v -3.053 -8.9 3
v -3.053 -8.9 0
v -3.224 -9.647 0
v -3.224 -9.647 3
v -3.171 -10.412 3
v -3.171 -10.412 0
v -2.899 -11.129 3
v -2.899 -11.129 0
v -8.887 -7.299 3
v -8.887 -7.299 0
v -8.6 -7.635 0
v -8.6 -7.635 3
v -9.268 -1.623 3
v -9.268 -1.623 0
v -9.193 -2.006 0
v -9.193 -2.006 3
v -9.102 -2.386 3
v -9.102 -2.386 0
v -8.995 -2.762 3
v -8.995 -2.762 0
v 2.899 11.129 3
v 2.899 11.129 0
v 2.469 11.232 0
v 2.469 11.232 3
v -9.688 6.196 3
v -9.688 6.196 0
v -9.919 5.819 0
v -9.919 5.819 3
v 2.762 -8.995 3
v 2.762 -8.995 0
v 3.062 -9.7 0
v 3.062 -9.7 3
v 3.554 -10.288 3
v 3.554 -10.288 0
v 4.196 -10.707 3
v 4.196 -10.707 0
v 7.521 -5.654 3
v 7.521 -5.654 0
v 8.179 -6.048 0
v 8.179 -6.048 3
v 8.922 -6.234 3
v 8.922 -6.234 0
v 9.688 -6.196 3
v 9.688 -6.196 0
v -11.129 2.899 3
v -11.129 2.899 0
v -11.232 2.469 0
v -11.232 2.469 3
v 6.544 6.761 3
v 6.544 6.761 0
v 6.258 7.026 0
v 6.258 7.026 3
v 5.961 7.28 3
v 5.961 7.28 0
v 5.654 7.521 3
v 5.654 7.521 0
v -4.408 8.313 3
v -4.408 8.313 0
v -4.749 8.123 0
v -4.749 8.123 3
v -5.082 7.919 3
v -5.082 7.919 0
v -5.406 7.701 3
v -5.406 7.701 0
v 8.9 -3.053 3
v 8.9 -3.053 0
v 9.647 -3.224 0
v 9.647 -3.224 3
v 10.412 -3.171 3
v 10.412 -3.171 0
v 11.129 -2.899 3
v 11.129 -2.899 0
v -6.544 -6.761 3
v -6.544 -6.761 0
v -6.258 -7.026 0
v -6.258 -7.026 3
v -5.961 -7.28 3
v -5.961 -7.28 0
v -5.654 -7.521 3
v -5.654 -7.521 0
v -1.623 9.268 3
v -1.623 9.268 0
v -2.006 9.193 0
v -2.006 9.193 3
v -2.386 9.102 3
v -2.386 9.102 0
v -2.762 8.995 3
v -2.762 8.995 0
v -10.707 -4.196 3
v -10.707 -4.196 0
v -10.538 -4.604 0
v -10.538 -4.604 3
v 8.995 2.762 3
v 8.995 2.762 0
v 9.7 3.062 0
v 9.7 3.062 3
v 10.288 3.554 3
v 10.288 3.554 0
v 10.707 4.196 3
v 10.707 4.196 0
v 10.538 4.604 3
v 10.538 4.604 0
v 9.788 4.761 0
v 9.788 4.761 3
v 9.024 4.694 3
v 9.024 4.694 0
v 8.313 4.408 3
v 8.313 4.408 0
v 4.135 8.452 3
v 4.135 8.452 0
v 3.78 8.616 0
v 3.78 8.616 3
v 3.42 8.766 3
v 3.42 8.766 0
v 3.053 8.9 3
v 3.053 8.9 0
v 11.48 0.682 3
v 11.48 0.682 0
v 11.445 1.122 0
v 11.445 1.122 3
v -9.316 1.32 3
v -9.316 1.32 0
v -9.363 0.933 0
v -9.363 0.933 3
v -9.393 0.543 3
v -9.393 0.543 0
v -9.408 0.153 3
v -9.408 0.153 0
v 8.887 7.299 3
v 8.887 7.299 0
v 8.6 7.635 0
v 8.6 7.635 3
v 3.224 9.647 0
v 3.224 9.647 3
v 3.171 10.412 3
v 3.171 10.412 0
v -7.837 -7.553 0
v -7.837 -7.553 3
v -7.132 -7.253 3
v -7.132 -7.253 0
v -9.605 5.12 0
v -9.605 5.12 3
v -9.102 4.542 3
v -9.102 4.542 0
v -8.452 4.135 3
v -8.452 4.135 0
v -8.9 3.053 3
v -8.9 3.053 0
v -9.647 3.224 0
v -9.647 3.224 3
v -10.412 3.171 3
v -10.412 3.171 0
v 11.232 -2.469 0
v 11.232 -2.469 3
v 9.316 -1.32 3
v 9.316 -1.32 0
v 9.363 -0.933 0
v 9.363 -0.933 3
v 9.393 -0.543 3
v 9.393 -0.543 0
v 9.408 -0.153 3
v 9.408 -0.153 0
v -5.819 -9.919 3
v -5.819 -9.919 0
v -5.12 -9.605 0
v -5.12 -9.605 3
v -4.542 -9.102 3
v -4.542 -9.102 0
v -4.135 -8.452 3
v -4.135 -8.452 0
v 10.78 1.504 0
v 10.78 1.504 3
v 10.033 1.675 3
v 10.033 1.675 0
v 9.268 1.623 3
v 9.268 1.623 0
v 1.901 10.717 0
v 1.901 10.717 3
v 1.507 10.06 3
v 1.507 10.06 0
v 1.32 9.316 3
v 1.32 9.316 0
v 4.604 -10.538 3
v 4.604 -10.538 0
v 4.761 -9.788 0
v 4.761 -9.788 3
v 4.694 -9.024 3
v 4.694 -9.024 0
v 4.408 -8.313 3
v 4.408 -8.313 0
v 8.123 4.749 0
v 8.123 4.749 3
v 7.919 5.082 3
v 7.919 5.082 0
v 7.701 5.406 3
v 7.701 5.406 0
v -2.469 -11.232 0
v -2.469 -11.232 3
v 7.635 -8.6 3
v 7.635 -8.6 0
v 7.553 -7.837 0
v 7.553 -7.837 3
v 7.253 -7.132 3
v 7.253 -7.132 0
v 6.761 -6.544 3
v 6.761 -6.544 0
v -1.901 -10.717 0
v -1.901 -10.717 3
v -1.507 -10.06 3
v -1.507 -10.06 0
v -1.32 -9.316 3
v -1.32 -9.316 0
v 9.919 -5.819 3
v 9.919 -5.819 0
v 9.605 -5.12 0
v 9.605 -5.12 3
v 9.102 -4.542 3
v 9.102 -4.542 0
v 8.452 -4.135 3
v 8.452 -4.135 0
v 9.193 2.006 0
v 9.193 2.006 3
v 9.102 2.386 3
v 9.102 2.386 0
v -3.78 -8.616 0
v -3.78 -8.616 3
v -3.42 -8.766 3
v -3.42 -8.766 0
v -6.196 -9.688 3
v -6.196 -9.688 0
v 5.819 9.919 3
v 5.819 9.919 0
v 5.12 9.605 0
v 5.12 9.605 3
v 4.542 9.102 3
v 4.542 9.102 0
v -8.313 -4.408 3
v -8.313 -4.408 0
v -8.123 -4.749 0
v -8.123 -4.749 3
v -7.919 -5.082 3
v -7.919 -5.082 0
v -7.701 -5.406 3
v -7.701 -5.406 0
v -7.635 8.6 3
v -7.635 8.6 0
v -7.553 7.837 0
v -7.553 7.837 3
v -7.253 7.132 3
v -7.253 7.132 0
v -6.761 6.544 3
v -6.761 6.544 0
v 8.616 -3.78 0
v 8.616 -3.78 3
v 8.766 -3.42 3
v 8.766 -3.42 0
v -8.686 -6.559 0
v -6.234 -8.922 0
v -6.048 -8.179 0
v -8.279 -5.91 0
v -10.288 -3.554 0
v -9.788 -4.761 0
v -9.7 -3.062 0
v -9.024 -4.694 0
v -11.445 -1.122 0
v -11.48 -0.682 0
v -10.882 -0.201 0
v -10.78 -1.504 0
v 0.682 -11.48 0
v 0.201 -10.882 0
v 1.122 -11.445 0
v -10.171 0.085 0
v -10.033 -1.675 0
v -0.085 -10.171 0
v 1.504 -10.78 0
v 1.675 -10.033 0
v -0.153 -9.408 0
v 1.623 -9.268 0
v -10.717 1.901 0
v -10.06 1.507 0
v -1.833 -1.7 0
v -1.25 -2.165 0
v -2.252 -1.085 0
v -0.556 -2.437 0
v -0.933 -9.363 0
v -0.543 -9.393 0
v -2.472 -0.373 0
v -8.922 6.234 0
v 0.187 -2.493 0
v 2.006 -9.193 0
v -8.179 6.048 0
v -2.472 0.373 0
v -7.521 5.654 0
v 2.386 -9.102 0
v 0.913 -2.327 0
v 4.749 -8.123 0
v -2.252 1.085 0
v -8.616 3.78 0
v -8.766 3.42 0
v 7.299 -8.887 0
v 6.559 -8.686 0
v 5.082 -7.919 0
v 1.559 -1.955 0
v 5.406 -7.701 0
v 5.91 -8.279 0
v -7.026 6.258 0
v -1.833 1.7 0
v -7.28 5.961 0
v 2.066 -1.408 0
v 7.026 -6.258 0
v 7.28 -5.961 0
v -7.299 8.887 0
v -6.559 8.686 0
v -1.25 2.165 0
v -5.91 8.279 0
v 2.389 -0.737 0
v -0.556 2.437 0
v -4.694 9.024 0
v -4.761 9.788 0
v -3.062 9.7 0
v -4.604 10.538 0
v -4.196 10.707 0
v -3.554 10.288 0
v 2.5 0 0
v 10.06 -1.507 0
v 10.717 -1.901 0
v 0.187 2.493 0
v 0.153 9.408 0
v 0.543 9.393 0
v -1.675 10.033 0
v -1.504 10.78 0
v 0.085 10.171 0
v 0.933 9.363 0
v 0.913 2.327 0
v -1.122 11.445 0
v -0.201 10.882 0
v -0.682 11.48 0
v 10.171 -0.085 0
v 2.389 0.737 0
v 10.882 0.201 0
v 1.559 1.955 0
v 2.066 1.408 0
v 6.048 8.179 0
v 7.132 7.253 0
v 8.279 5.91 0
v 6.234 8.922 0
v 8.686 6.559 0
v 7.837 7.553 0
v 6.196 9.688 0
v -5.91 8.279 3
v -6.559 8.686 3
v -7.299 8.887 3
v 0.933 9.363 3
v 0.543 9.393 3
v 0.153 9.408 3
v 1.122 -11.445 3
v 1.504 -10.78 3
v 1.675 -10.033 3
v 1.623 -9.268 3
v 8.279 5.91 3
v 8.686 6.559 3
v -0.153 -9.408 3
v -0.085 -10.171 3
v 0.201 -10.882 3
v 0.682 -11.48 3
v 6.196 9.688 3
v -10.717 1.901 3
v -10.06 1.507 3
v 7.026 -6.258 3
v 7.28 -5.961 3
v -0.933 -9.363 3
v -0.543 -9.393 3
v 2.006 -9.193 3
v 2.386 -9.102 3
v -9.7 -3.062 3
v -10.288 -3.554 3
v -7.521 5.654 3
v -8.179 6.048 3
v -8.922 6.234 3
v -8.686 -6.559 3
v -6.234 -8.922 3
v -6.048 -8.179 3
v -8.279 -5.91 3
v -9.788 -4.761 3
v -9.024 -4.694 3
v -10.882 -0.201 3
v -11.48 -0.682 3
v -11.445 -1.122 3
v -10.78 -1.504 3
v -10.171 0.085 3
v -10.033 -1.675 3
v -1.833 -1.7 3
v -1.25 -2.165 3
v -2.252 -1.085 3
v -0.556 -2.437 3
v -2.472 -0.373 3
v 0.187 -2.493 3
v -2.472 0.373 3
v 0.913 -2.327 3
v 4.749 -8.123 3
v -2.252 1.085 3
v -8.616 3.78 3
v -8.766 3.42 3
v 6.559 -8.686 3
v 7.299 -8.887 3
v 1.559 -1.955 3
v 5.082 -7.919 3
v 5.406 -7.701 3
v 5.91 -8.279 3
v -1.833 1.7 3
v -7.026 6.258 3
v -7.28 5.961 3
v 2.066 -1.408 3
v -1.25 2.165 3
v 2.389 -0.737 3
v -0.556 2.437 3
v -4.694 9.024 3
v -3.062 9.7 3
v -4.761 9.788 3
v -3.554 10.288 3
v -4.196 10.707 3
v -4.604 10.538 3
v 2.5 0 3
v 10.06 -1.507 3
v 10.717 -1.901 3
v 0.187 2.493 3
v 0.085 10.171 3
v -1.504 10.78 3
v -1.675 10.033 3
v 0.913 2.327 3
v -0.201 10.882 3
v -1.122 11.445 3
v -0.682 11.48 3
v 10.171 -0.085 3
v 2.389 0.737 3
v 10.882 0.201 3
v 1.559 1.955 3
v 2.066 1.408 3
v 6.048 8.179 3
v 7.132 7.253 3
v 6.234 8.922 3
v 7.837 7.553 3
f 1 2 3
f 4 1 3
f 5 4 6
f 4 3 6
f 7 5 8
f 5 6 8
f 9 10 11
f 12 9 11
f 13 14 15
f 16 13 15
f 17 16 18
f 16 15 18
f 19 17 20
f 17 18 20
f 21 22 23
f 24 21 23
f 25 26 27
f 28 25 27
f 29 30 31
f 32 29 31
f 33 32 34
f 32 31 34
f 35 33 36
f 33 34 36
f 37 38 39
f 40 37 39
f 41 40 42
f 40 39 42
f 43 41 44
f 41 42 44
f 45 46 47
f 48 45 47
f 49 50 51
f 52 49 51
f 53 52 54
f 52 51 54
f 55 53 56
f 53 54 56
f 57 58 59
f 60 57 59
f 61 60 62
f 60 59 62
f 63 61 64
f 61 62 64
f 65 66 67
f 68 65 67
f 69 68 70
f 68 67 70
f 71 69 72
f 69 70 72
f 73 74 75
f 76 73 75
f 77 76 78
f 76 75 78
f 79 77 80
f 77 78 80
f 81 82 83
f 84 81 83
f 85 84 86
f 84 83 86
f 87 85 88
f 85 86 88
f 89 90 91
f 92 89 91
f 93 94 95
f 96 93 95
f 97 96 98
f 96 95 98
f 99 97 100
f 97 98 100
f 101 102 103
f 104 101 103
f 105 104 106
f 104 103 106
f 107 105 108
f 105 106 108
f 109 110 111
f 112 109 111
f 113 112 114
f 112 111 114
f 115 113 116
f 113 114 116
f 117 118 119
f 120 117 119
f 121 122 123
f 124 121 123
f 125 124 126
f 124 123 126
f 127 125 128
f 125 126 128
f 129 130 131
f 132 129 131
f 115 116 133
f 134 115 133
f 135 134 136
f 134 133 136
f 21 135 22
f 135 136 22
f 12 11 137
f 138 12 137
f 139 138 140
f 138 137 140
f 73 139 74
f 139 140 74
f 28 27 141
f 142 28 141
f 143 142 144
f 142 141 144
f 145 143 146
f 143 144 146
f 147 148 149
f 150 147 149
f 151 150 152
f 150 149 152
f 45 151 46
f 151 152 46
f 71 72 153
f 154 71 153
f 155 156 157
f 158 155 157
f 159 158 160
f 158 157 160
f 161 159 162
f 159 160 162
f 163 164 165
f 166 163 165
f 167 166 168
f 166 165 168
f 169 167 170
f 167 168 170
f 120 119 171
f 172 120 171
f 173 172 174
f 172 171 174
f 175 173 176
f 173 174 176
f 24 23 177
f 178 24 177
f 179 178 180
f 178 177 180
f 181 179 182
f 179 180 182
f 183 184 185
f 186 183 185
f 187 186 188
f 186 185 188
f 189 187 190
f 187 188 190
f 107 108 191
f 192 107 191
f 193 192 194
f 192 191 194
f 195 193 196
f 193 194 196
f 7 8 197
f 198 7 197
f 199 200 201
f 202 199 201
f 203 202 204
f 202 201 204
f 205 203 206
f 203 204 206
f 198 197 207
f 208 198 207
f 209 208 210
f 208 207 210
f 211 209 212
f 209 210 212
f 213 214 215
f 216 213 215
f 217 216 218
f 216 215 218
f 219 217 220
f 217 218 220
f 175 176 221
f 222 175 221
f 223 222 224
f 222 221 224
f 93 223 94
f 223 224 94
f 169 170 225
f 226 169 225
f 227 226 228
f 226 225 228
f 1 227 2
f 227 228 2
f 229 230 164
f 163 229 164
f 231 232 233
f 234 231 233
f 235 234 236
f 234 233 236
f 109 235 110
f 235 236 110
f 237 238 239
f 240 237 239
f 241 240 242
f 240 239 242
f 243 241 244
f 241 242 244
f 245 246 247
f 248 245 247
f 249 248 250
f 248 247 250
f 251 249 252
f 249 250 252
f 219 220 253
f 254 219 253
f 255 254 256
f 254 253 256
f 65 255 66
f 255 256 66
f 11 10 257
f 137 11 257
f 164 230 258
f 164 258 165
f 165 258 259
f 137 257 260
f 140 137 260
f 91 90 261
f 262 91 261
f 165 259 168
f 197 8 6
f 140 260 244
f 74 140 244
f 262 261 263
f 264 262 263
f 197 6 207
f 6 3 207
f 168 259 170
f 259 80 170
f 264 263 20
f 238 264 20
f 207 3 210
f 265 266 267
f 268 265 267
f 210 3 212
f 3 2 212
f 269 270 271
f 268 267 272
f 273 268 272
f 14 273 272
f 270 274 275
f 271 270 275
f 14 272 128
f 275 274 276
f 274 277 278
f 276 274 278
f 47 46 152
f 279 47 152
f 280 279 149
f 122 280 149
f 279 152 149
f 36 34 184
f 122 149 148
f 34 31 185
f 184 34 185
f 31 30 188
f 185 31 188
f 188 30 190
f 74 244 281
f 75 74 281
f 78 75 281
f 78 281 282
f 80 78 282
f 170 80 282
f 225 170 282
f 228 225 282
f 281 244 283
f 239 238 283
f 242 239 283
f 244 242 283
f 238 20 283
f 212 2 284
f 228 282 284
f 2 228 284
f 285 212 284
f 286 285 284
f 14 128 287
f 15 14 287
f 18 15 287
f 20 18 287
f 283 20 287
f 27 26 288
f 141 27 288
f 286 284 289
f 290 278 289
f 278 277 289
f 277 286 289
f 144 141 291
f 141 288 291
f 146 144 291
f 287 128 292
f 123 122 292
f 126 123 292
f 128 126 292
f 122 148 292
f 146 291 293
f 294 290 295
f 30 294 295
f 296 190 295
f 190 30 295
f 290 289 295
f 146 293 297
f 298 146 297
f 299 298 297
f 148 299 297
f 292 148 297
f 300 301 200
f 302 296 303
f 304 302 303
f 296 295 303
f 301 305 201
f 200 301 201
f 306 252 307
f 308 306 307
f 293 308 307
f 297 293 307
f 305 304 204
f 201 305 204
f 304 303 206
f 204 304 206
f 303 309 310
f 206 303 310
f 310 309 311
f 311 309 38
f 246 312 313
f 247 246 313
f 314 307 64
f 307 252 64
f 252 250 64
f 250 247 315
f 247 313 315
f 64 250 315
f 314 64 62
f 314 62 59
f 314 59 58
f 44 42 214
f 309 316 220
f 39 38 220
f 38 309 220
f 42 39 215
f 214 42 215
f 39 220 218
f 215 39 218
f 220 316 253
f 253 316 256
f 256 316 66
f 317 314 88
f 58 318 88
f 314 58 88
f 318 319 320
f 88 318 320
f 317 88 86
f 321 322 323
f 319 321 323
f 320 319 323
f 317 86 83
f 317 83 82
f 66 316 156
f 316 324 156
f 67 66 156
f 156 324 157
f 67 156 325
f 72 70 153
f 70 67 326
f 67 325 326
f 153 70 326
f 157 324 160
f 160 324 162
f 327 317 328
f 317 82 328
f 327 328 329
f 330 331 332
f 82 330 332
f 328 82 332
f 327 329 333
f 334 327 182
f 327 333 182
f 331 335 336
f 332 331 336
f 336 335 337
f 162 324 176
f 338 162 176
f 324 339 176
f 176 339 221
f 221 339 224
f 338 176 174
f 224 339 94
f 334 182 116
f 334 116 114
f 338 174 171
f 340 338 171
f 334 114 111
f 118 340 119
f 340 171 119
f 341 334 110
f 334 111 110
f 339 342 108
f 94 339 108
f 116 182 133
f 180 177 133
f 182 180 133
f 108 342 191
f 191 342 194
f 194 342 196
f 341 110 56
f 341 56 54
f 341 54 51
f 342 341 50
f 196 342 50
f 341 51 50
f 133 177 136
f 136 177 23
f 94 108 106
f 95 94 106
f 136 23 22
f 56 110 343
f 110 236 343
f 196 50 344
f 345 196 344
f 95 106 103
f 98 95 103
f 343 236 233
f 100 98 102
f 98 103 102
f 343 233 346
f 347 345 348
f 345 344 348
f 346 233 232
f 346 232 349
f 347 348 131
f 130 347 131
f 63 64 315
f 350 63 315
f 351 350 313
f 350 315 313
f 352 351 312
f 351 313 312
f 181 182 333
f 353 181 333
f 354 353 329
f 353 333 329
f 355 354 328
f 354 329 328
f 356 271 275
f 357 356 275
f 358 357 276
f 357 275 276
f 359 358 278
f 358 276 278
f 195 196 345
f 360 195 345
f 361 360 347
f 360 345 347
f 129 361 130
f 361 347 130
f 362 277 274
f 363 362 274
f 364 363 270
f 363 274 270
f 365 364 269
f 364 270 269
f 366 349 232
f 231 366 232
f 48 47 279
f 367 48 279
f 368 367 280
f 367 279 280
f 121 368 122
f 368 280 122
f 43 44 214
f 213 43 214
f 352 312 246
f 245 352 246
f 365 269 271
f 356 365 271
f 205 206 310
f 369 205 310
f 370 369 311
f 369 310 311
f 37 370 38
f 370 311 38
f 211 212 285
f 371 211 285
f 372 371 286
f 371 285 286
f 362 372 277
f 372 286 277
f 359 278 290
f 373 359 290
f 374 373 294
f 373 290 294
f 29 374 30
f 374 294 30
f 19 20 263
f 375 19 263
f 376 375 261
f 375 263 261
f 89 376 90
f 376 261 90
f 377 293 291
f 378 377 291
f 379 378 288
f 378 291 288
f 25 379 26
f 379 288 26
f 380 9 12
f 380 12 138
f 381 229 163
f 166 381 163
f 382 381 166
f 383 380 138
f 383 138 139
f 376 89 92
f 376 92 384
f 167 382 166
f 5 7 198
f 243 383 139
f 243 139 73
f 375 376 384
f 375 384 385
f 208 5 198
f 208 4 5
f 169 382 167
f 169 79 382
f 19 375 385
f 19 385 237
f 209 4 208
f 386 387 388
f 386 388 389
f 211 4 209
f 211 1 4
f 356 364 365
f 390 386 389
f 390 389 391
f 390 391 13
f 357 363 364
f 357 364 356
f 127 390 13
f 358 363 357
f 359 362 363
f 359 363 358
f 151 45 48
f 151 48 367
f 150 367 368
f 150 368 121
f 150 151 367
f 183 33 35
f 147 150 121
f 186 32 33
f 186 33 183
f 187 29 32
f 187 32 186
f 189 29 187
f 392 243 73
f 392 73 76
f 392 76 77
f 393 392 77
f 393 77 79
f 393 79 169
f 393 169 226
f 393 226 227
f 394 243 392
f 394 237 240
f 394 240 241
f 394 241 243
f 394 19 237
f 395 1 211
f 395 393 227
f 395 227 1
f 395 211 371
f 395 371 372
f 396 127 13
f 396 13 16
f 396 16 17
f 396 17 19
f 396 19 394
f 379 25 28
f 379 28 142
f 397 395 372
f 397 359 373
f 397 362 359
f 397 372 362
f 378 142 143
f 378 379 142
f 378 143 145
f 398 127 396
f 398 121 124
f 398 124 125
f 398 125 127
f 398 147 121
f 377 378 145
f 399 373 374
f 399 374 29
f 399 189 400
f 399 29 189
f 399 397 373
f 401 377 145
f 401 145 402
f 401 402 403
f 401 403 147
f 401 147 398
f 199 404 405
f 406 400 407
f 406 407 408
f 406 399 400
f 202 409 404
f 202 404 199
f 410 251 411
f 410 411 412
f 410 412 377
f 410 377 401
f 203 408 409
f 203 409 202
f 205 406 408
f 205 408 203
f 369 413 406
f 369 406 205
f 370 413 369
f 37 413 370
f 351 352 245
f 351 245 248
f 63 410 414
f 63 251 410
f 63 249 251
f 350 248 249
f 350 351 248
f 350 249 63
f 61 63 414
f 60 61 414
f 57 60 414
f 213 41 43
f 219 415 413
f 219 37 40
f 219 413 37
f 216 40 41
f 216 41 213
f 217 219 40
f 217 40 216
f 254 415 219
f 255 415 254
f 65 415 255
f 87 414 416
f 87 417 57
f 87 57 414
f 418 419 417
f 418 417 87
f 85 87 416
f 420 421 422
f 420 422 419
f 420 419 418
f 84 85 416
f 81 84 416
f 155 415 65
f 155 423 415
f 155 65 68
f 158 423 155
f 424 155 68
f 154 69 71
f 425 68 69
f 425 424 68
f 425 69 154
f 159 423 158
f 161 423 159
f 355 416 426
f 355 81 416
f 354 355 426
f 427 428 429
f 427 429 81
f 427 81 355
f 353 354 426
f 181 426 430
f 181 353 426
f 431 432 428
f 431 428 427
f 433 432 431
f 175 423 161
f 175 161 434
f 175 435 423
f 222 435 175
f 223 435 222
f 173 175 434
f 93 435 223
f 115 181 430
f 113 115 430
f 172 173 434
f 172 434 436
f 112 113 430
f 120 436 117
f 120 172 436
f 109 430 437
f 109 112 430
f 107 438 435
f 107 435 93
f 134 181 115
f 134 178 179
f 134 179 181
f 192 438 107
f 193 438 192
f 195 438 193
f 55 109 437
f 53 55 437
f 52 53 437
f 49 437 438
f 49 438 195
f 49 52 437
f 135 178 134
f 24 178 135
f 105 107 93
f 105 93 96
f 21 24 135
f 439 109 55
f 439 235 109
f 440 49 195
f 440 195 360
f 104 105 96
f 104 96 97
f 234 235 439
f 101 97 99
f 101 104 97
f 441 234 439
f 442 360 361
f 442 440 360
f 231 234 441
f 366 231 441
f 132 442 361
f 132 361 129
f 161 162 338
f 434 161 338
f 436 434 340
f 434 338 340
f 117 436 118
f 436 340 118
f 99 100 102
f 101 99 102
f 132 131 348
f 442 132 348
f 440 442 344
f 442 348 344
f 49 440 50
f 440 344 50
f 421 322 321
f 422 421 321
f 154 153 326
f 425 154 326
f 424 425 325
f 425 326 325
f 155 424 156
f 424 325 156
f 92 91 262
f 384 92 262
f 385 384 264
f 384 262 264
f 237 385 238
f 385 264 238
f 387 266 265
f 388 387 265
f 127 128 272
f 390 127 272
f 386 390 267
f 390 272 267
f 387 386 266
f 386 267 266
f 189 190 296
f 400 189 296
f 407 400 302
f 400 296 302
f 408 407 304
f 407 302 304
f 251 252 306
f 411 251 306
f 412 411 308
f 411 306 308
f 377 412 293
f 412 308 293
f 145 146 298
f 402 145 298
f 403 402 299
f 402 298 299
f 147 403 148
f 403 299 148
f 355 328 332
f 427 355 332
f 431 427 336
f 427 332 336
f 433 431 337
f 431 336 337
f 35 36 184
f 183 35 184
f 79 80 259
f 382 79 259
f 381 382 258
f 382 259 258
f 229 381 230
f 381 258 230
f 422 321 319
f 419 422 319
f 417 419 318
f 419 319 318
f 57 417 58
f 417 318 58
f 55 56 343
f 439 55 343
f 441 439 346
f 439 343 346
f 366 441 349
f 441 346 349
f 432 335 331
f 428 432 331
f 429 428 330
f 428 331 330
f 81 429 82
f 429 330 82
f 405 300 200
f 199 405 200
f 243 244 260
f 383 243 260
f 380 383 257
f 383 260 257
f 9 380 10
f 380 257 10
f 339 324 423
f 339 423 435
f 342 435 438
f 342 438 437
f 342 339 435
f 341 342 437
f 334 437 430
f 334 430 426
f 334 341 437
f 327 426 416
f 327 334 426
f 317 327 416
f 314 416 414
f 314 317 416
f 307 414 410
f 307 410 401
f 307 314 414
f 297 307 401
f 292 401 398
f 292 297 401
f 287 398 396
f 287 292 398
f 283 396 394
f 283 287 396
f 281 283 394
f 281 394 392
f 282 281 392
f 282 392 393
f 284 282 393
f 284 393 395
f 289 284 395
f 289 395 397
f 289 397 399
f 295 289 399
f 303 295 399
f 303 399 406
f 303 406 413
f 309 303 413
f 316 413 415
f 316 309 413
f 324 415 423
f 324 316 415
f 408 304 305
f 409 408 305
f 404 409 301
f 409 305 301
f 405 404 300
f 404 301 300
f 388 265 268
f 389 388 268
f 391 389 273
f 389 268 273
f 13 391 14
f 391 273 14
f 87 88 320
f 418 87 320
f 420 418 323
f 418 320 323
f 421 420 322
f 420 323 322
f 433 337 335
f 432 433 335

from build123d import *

# Parameters (mm, degrees)
F1_R     = 2.5
F2_DEPTH = 3


with BuildPart() as f2:
    # F1 (on Top) → F2 (new body)
    with BuildSketch(Plane.XY):
        with BuildLine():
            ThreePointArc((-1.6229776334, 9.2680599554), (-0.7382287643, 9.3800858219), (0.1531520845, 9.4078443957))
            ThreePointArc((0.1531520845, 9.4078443957), (-0.0317997207, 10.5374998224), (-0.6817601701, 11.4797736507))
            Line((-0.6817601701, 11.4797736507), (-1.1224656787, 11.4450893749))
            ThreePointArc((-1.1224656787, 11.4450893749), (-1.6170199342, 10.4127402859), (-1.6229776334, 9.2680599554))
        make_face()
        with BuildLine():
            ThreePointArc((9.4078443957, -0.1531520845), (9.4087792756, -0.0765785786), (9.4090909091, 0))
            ThreePointArc((9.4090909091, 0), (9.3737668631, 0.8145468262), (9.2680599554, 1.6229776334))
            ThreePointArc((9.2680599554, 1.6229776334), (9.1491169783, 2.1965086508), (8.9947183137, 2.7615275108))
            ThreePointArc((8.9947183137, 2.7615275108), (8.6928665104, 3.6007032045), (8.3129211438, 4.4075314852))
            ThreePointArc((8.3129211438, 4.4075314852), (8.0225688191, 4.9162364953), (7.7011265332, 5.4058895526))
            ThreePointArc((7.7011265332, 5.4058895526), (7.1547288581, 6.1107157275), (6.5440556911, 6.7606454461))
            ThreePointArc((6.5440556911, 6.7606454461), (6.1107157275, 7.1547288581), (5.6536948308, 7.52108546))
            ThreePointArc((5.6536948308, 7.52108546), (4.9162364953, 8.0225688191), (4.1346124722, 8.4519803265))
            ThreePointArc((4.1346124722, 8.4519803265), (3.6007032045, 8.6928665104), (3.0528400867, 8.90006512))
            ThreePointArc((3.0528400867, 8.90006512), (2.1965086508, 9.1491169783), (1.320444577, 9.3159764842))
            ThreePointArc((1.320444577, 9.3159764842), (0.7382287643, 9.3800858219), (0.1531520845, 9.4078443957))
            ThreePointArc((0.1531520845, 9.4078443957), (-0.7382287643, 9.3800858219), (-1.6229776334, 9.2680599554))
            ThreePointArc((-1.6229776334, 9.2680599554), (-2.1965086508, 9.1491169783), (-2.7615275108, 8.9947183137))
            ThreePointArc((-2.7615275108, 8.9947183137), (-3.6007032045, 8.6928665104), (-4.4075314852, 8.3129211438))
            ThreePointArc((-4.4075314852, 8.3129211438), (-4.9162364953, 8.0225688191), (-5.4058895526, 7.7011265332))
            ThreePointArc((-5.4058895526, 7.7011265332), (-6.1107157275, 7.1547288581), (-6.7606454461, 6.5440556911))
            ThreePointArc((-6.7606454461, 6.5440556911), (-7.1547288581, 6.1107157275), (-7.52108546, 5.6536948308))
            ThreePointArc((-7.52108546, 5.6536948308), (-8.0225688191, 4.9162364953), (-8.4519803265, 4.1346124722))
            ThreePointArc((-8.4519803265, 4.1346124722), (-8.6928665104, 3.6007032045), (-8.90006512, 3.0528400867))
            ThreePointArc((-8.90006512, 3.0528400867), (-9.1491169783, 2.1965086508), (-9.3159764842, 1.320444577))
            ThreePointArc((-9.3159764842, 1.320444577), (-9.3800858219, 0.7382287643), (-9.4078443957, 0.1531520845))
            ThreePointArc((-9.4078443957, 0.1531520845), (-9.3800858219, -0.7382287643), (-9.2680599554, -1.6229776334))
            ThreePointArc((-9.2680599554, -1.6229776334), (-9.1491169783, -2.1965086508), (-8.9947183137, -2.7615275108))
            ThreePointArc((-8.9947183137, -2.7615275108), (-8.6928665104, -3.6007032045), (-8.3129211438, -4.4075314852))
            ThreePointArc((-8.3129211438, -4.4075314852), (-8.0225688191, -4.9162364953), (-7.7011265332, -5.4058895526))
            ThreePointArc((-7.7011265332, -5.4058895526), (-7.1547288581, -6.1107157275), (-6.5440556911, -6.7606454461))
            ThreePointArc((-6.5440556911, -6.7606454461), (-6.1107157275, -7.1547288581), (-5.6536948308, -7.52108546))
            ThreePointArc((-5.6536948308, -7.52108546), (-4.9162364953, -8.0225688191), (-4.1346124722, -8.4519803265))
            ThreePointArc((-4.1346124722, -8.4519803265), (-3.6007032045, -8.6928665104), (-3.0528400867, -8.90006512))
            ThreePointArc((-3.0528400867, -8.90006512), (-2.1965086508, -9.1491169783), (-1.320444577, -9.3159764842))
            ThreePointArc((-1.320444577, -9.3159764842), (-0.7382287643, -9.3800858219), (-0.1531520845, -9.4078443957))
            ThreePointArc((-0.1531520845, -9.4078443957), (0.7382287643, -9.3800858219), (1.6229776334, -9.2680599554))
            ThreePointArc((1.6229776334, -9.2680599554), (2.1965086508, -9.1491169783), (2.7615275108, -8.9947183137))
            ThreePointArc((2.7615275108, -8.9947183137), (3.6007032045, -8.6928665104), (4.4075314852, -8.3129211438))
            ThreePointArc((4.4075314852, -8.3129211438), (4.9162364953, -8.0225688191), (5.4058895526, -7.7011265332))
            ThreePointArc((5.4058895526, -7.7011265332), (6.1107157275, -7.1547288581), (6.7606454461, -6.5440556911))
            ThreePointArc((6.7606454461, -6.5440556911), (7.1547288581, -6.1107157275), (7.52108546, -5.6536948308))
            ThreePointArc((7.52108546, -5.6536948308), (8.0225688191, -4.9162364953), (8.4519803265, -4.1346124722))
            ThreePointArc((8.4519803265, -4.1346124722), (8.6928665104, -3.6007032045), (8.90006512, -3.0528400867))
            ThreePointArc((8.90006512, -3.0528400867), (9.1491169783, -2.1965086508), (9.3159764842, -1.320444577))
            ThreePointArc((9.3159764842, -1.320444577), (9.3800858219, -0.7382287643), (9.4078443957, -0.1531520845))
        make_face()
        Circle(F1_R, mode=Mode.SUBTRACT)
        with BuildLine():
            ThreePointArc((-4.4075314852, 8.3129211438), (-3.6007032045, 8.6928665104), (-2.7615275108, 8.9947183137))
            ThreePointArc((-2.7615275108, 8.9947183137), (-3.286509855, 10.0119312174), (-4.195837602, 10.7072380574))
            Line((-4.195837602, 10.7072380574), (-4.604255417, 10.5380658593))
            ThreePointArc((-4.604255417, 10.5380658593), (-4.7555910517, 9.4034178615), (-4.4075314852, 8.3129211438))
        make_face()
        with BuildLine():
            ThreePointArc((-6.7606454461, 6.5440556911), (-6.1107157275, 7.1547288581), (-5.4058895526, 7.7011265332))
            ThreePointArc((-5.4058895526, 7.7011265332), (-6.2195135061, 8.5063250277), (-7.2991972152, 8.8866034014))
            Line((-7.2991972152, 8.8866034014), (-7.6353485554, 8.5995030343))
            ThreePointArc((-7.6353485554, 8.5995030343), (-7.428651783, 7.4736233793), (-6.7606454461, 6.5440556911))
        make_face()
        with BuildLine():
            ThreePointArc((-8.4519803265, 4.1346124722), (-8.0225688191, 4.9162364953), (-7.52108546, 5.6536948308))
            ThreePointArc((-7.52108546, 5.6536948308), (-8.5437078414, 6.1680604771), (-9.6880605486, 6.1960860878))
            Line((-9.6880605486, 6.1960860878), (-9.9190405786, 5.8191609361))
            ThreePointArc((-9.9190405786, 5.8191609361), (-9.3745443193, 4.812258569), (-8.4519803265, 4.1346124722))
        make_face()
        with BuildLine():
            ThreePointArc((-9.3159764842, 1.320444577), (-9.1491169783, 2.1965086508), (-8.90006512, 3.0528400867))
            ThreePointArc((-8.90006512, 3.0528400867), (-10.0315845257, 3.2260231917), (-11.1285890147, 2.8990526973))
            Line((-11.1285890147, 2.8990526973), (-11.2317877999, 2.469198821))
            ThreePointArc((-11.2317877999, 2.469198821), (-10.4027911413, 1.679836361), (-9.3159764842, 1.320444577))
        make_face()
        with BuildLine():
            ThreePointArc((-9.2680599554, -1.6229776334), (-9.3800858219, -0.7382287643), (-9.4078443957, 0.1531520845))
            ThreePointArc((-9.4078443957, 0.1531520845), (-10.5374998224, -0.0317997207), (-11.4797736507, -0.6817601701))
            Line((-11.4797736507, -0.6817601701), (-11.4450893749, -1.1224656787))
            ThreePointArc((-11.4450893749, -1.1224656787), (-10.4127402859, -1.6170199342), (-9.2680599554, -1.6229776334))
        make_face()
        with BuildLine():
            ThreePointArc((-10.5380658593, -4.604255417), (-9.4034178615, -4.7555910517), (-8.3129211438, -4.4075314852))
            ThreePointArc((-8.3129211438, -4.4075314852), (-8.6928665104, -3.6007032045), (-8.9947183137, -2.7615275108))
            ThreePointArc((-8.9947183137, -2.7615275108), (-10.0119312174, -3.286509855), (-10.7072380574, -4.195837602))
            Line((-10.7072380574, -4.195837602), (-10.5380658593, -4.604255417))
        make_face()
        with BuildLine():
            ThreePointArc((-8.5995030343, -7.6353485554), (-7.4736233793, -7.428651783), (-6.5440556911, -6.7606454461))
            ThreePointArc((-6.5440556911, -6.7606454461), (-7.1547288581, -6.1107157275), (-7.7011265332, -5.4058895526))
            ThreePointArc((-7.7011265332, -5.4058895526), (-8.5063250277, -6.2195135061), (-8.8866034014, -7.2991972152))
            Line((-8.8866034014, -7.2991972152), (-8.5995030343, -7.6353485554))
        make_face()
        with BuildLine():
            ThreePointArc((-5.8191609361, -9.9190405786), (-4.812258569, -9.3745443193), (-4.1346124722, -8.4519803265))
            ThreePointArc((-4.1346124722, -8.4519803265), (-4.9162364953, -8.0225688191), (-5.6536948308, -7.52108546))
            ThreePointArc((-5.6536948308, -7.52108546), (-6.1680604771, -8.5437078414), (-6.1960860878, -9.6880605486))
            Line((-6.1960860878, -9.6880605486), (-5.8191609361, -9.9190405786))
        make_face()
        with BuildLine():
            ThreePointArc((-2.469198821, -11.2317877999), (-1.679836361, -10.4027911413), (-1.320444577, -9.3159764842))
            ThreePointArc((-1.320444577, -9.3159764842), (-2.1965086508, -9.1491169783), (-3.0528400867, -8.90006512))
            ThreePointArc((-3.0528400867, -8.90006512), (-3.2260231917, -10.0315845257), (-2.8990526973, -11.1285890147))
            Line((-2.8990526973, -11.1285890147), (-2.469198821, -11.2317877999))
        make_face()
        with BuildLine():
            ThreePointArc((1.1224656787, -11.4450893749), (1.6170199342, -10.4127402859), (1.6229776334, -9.2680599554))
            ThreePointArc((1.6229776334, -9.2680599554), (0.7382287643, -9.3800858219), (-0.1531520845, -9.4078443957))
            ThreePointArc((-0.1531520845, -9.4078443957), (0.0317997207, -10.5374998224), (0.6817601701, -11.4797736507))
            Line((0.6817601701, -11.4797736507), (1.1224656787, -11.4450893749))
        make_face()
        with BuildLine():
            ThreePointArc((4.604255417, -10.5380658593), (4.7555910517, -9.4034178615), (4.4075314852, -8.3129211438))
            ThreePointArc((4.4075314852, -8.3129211438), (3.6007032045, -8.6928665104), (2.7615275108, -8.9947183137))
            ThreePointArc((2.7615275108, -8.9947183137), (3.286509855, -10.0119312174), (4.195837602, -10.7072380574))
            Line((4.195837602, -10.7072380574), (4.604255417, -10.5380658593))
        make_face()
        with BuildLine():
            ThreePointArc((7.6353485554, -8.5995030343), (7.428651783, -7.4736233793), (6.7606454461, -6.5440556911))
            ThreePointArc((6.7606454461, -6.5440556911), (6.1107157275, -7.1547288581), (5.4058895526, -7.7011265332))
            ThreePointArc((5.4058895526, -7.7011265332), (6.2195135061, -8.5063250277), (7.2991972152, -8.8866034014))
            Line((7.2991972152, -8.8866034014), (7.6353485554, -8.5995030343))
        make_face()
        with BuildLine():
            ThreePointArc((9.9190405786, -5.8191609361), (9.3745443193, -4.812258569), (8.4519803265, -4.1346124722))
            ThreePointArc((8.4519803265, -4.1346124722), (8.0225688191, -4.9162364953), (7.52108546, -5.6536948308))
            ThreePointArc((7.52108546, -5.6536948308), (8.5437078414, -6.1680604771), (9.6880605486, -6.1960860878))
            Line((9.6880605486, -6.1960860878), (9.9190405786, -5.8191609361))
        make_face()
        with BuildLine():
            ThreePointArc((11.2317877999, -2.469198821), (10.4027911413, -1.679836361), (9.3159764842, -1.320444577))
            ThreePointArc((9.3159764842, -1.320444577), (9.1491169783, -2.1965086508), (8.90006512, -3.0528400867))
            ThreePointArc((8.90006512, -3.0528400867), (10.0315845257, -3.2260231917), (11.1285890147, -2.8990526973))
            Line((11.1285890147, -2.8990526973), (11.2317877999, -2.469198821))
        make_face()
        with BuildLine():
            ThreePointArc((9.2680599554, 1.6229776334), (9.3737668631, 0.8145468262), (9.4090909091, 0))
            ThreePointArc((9.4090909091, 0), (9.4087792756, -0.0765785786), (9.4078443957, -0.1531520845))
            ThreePointArc((9.4078443957, -0.1531520845), (10.5374998224, 0.0317997207), (11.4797736507, 0.6817601701))
            Line((11.4797736507, 0.6817601701), (11.4450893749, 1.1224656787))
            ThreePointArc((11.4450893749, 1.1224656787), (10.4127402859, 1.6170199342), (9.2680599554, 1.6229776334))
        make_face()
        with BuildLine():
            ThreePointArc((8.3129211438, 4.4075314852), (8.6928665104, 3.6007032045), (8.9947183137, 2.7615275108))
            ThreePointArc((8.9947183137, 2.7615275108), (10.0119312174, 3.286509855), (10.7072380574, 4.195837602))
            Line((10.7072380574, 4.195837602), (10.5380658593, 4.604255417))
            ThreePointArc((10.5380658593, 4.604255417), (9.4034178615, 4.7555910517), (8.3129211438, 4.4075314852))
        make_face()
        with BuildLine():
            ThreePointArc((6.5440556911, 6.7606454461), (7.1547288581, 6.1107157275), (7.7011265332, 5.4058895526))
            ThreePointArc((7.7011265332, 5.4058895526), (8.5063250277, 6.2195135061), (8.8866034014, 7.2991972152))
            Line((8.8866034014, 7.2991972152), (8.5995030343, 7.6353485554))
            ThreePointArc((8.5995030343, 7.6353485554), (7.4736233793, 7.428651783), (6.5440556911, 6.7606454461))
        make_face()
        with BuildLine():
            ThreePointArc((4.1346124722, 8.4519803265), (4.9162364953, 8.0225688191), (5.6536948308, 7.52108546))
            ThreePointArc((5.6536948308, 7.52108546), (6.1680604771, 8.5437078414), (6.1960860878, 9.6880605486))
            Line((6.1960860878, 9.6880605486), (5.8191609361, 9.9190405786))
            ThreePointArc((5.8191609361, 9.9190405786), (4.812258569, 9.3745443193), (4.1346124722, 8.4519803265))
        make_face()
        with BuildLine():
            ThreePointArc((1.320444577, 9.3159764842), (2.1965086508, 9.1491169783), (3.0528400867, 8.90006512))
            ThreePointArc((3.0528400867, 8.90006512), (3.2260231917, 10.0315845257), (2.8990526973, 11.1285890147))
            Line((2.8990526973, 11.1285890147), (2.469198821, 11.2317877999))
            ThreePointArc((2.469198821, 11.2317877999), (1.679836361, 10.4027911413), (1.320444577, 9.3159764842))
        make_face()
    extrude(amount=F2_DEPTH)


solid = f2.part
